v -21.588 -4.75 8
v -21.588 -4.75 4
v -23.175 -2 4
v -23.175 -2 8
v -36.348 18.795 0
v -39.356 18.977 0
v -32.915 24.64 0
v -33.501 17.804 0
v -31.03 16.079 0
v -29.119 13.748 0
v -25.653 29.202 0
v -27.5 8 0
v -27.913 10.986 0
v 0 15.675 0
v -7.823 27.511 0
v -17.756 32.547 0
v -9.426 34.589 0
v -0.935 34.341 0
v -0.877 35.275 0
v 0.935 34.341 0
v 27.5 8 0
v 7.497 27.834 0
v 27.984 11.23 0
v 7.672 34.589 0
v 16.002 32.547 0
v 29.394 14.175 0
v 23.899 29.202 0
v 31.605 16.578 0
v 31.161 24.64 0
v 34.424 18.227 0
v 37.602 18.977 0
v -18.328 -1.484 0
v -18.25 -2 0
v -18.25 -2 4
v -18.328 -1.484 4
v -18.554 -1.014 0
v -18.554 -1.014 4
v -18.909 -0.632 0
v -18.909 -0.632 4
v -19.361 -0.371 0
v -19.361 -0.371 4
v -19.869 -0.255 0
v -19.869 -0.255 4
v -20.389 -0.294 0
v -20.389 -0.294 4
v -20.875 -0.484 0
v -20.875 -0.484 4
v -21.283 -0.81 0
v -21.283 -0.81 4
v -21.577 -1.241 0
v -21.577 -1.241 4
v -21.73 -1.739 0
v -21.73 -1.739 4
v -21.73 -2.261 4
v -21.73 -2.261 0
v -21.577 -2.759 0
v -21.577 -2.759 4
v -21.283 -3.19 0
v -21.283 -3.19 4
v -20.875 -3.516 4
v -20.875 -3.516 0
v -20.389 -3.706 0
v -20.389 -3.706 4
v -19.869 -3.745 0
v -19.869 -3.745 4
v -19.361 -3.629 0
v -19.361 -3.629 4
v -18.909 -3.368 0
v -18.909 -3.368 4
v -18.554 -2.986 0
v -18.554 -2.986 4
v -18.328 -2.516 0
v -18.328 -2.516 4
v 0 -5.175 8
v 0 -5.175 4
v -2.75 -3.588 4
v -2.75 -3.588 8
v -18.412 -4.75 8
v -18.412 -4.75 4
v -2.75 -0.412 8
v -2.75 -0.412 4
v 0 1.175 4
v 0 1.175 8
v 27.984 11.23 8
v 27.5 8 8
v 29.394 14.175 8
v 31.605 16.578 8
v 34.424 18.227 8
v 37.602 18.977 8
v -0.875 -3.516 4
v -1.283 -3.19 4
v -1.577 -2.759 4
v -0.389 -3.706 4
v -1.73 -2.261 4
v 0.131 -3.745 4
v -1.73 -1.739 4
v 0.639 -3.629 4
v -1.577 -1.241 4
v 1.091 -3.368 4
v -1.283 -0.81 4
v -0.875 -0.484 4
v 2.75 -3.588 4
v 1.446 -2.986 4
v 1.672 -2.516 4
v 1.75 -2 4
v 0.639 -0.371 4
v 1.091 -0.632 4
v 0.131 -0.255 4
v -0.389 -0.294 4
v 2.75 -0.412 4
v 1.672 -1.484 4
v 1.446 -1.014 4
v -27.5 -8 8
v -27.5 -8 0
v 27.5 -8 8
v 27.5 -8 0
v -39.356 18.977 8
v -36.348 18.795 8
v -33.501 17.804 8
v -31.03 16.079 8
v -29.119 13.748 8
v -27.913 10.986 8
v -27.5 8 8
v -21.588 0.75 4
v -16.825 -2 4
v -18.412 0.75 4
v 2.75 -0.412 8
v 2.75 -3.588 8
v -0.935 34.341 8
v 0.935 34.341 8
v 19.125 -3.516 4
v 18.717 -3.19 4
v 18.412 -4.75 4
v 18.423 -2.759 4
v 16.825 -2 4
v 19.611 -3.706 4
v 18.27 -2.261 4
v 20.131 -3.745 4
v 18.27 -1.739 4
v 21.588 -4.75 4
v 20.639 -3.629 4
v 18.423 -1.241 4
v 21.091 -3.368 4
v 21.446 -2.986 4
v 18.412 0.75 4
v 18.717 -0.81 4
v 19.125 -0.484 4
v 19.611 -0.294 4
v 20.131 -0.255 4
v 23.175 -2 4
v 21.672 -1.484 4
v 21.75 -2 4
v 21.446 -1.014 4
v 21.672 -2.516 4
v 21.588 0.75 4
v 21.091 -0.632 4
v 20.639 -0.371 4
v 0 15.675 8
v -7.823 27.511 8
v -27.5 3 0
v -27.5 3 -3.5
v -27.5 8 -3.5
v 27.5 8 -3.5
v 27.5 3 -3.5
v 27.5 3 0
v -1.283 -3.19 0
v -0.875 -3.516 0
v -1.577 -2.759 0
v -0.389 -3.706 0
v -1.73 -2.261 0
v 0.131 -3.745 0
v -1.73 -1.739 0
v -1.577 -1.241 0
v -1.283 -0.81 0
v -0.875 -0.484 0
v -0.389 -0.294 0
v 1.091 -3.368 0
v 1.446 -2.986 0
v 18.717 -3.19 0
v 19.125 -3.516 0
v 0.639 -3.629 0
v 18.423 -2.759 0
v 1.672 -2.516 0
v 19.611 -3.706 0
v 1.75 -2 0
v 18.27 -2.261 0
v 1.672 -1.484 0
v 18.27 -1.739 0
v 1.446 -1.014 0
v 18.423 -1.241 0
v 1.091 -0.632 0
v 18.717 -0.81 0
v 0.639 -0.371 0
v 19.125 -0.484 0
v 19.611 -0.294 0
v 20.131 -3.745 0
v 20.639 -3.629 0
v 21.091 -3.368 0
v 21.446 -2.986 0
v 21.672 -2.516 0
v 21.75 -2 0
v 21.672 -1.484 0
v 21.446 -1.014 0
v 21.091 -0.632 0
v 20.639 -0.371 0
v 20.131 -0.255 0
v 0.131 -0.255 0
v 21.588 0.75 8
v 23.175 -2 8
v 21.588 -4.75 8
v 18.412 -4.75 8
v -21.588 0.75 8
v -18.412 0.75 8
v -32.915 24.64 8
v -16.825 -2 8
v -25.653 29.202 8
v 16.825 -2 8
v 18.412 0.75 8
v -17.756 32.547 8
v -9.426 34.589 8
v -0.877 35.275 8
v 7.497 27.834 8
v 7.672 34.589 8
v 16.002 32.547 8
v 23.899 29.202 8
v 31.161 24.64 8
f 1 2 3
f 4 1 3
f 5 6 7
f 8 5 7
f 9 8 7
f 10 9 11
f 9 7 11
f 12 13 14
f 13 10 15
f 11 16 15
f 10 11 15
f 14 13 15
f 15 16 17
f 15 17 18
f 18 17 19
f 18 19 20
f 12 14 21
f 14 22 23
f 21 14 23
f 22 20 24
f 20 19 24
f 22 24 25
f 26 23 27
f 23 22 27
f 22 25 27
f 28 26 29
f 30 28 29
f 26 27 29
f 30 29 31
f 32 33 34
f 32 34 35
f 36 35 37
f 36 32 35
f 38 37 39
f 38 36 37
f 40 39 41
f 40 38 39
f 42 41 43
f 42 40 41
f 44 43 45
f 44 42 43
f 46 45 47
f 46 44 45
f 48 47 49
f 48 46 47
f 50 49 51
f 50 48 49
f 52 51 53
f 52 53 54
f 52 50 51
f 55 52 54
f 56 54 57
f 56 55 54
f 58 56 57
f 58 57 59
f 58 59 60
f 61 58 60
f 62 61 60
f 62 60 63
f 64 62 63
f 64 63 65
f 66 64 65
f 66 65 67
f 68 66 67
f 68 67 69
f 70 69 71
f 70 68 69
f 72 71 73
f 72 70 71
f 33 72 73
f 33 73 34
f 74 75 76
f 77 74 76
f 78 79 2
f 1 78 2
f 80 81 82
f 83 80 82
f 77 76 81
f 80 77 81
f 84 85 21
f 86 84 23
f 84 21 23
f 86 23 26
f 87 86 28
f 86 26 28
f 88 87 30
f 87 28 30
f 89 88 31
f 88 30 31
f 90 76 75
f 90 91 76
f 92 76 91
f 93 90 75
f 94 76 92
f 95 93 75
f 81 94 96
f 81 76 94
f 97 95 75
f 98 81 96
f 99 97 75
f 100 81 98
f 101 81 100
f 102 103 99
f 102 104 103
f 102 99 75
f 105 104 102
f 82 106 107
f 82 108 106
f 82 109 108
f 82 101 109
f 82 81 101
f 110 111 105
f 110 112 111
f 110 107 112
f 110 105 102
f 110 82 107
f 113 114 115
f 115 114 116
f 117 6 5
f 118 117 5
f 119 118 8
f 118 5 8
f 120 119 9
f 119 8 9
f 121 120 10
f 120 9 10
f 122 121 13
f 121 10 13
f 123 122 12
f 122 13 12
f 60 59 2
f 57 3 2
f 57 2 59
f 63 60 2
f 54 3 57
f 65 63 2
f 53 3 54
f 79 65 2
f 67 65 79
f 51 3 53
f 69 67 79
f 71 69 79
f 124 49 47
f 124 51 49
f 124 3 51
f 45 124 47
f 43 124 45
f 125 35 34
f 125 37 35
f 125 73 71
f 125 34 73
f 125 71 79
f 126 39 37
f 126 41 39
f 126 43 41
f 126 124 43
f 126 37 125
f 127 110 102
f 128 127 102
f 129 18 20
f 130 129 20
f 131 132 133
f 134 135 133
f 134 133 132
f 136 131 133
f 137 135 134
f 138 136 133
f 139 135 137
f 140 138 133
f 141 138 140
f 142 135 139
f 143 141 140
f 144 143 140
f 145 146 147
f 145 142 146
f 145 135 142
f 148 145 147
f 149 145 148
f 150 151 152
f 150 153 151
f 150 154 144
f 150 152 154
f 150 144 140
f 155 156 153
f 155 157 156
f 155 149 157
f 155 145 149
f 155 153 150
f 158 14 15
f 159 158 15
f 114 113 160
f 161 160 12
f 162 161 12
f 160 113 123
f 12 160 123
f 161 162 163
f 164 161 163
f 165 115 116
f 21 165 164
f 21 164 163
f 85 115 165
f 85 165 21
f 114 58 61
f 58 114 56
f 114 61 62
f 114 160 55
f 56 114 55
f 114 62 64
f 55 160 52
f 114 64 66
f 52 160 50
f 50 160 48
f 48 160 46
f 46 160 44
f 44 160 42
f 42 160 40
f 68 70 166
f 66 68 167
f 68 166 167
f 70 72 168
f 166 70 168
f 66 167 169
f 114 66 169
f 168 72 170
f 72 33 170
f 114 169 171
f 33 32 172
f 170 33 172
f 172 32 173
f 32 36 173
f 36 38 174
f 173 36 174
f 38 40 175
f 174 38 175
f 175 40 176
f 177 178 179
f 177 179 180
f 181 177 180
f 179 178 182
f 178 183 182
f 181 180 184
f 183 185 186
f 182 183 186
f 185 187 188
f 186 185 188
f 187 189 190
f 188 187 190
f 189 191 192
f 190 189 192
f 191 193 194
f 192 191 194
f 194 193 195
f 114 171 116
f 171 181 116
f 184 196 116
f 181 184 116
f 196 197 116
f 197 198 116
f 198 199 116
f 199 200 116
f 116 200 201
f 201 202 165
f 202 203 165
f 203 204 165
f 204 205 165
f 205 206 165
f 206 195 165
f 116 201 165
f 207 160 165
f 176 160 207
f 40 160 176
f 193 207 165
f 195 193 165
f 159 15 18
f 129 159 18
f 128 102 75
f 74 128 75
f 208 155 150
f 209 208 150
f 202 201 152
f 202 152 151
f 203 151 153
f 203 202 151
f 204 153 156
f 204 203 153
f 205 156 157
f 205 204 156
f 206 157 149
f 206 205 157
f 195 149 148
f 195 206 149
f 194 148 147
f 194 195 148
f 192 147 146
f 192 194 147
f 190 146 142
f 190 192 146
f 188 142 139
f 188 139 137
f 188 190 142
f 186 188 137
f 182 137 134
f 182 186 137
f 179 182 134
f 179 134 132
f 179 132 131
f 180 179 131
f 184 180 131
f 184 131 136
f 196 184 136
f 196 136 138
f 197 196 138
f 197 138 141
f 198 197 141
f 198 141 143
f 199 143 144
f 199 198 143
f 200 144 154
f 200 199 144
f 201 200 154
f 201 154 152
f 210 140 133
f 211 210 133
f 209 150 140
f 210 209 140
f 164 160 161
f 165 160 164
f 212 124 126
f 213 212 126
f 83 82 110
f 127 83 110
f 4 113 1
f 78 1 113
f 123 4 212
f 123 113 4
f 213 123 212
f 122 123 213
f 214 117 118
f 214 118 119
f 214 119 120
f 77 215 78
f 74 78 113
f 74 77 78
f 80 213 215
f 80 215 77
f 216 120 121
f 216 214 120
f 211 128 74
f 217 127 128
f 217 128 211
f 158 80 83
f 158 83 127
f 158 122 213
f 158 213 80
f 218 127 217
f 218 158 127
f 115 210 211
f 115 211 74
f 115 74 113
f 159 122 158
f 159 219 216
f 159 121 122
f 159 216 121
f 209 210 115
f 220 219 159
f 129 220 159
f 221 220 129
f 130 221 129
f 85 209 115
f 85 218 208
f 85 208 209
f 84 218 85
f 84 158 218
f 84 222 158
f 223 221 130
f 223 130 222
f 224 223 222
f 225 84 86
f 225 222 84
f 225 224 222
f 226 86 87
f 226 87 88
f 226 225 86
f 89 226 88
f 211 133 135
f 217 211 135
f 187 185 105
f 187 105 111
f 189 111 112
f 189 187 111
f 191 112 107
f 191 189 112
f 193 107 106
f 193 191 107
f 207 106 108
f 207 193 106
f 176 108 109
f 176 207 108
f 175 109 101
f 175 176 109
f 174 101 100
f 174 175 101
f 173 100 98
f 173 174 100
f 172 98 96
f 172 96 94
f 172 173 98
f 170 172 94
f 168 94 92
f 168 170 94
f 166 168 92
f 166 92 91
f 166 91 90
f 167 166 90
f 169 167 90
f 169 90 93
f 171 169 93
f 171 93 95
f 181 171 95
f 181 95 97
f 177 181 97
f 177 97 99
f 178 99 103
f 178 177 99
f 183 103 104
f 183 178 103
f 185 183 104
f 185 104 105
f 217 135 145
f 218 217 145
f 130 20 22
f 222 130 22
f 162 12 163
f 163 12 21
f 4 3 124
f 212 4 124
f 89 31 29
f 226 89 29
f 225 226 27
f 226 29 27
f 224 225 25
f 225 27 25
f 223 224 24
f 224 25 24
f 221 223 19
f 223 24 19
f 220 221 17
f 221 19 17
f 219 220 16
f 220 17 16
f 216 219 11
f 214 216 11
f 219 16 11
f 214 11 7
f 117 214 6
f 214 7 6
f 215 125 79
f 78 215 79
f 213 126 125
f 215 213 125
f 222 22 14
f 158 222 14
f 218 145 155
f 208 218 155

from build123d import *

# Parameters (mm, degrees)
F0_W     = 55
F0_H     = 11
F0_H_2   = 5
F1_DEPTH = 8
F0_R     = 1.75
F2_DEPTH = 4
F3_DEPTH = 3.5


with BuildPart() as f1:
    # F0 (on Top) → F1 (new body)
    with BuildSketch(Plane.XY):
        with Locations((0, -2.5)):
            Rectangle(F0_W, F0_H)
        Polygon((-16.824574, -2), (-18.412287, -4.75), (-21.587713, -4.75), (-23.175426, -2), (-21.587713, 0.75), (-18.412287, 0.75), align=None, mode=Mode.SUBTRACT)
        Polygon((0, 1.175426), (2.75, -0.412287), (2.75, -3.587713), (0, -5.175426), (-2.75, -3.587713), (-2.75, -0.412287), align=None, mode=Mode.SUBTRACT)
        Polygon((18.412287, -4.75), (16.824574, -2), (18.412287, 0.75), (21.587713, 0.75), (23.175426, -2), (21.587713, -4.75), align=None, mode=Mode.SUBTRACT)
        with Locations((0, 5.5)):
            Rectangle(F0_W, F0_H_2)
        Polygon((-27.5, 8), (27.5, 8), (7.497111, 27.834252), (0, 15.674993), (-7.823137, 27.510974), align=None)
        with BuildLine():
            Line((7.497111, 27.834252), (27.5, 8))
            ThreePointArc((27.5, 8), (30.409967, 15.459144), (37.60235, 18.97715))
            ThreePointArc((37.60235, 18.97715), (-0.876943, 35.275336), (-39.356235, 18.97715))
            ThreePointArc((-39.356235, 18.97715), (-31.029945, 16.078802), (-27.5, 8))
            Line((-27.5, 8), (-7.823137, 27.510974))
            Line((-7.823137, 27.510974), (-0.934656, 34.341381))
            Line((-0.934656, 34.341381), (0.934656, 34.341381))
            Line((0.934656, 34.341381), (7.497111, 27.834252))
        make_face()
    extrude(amount=F1_DEPTH)

    # F0 (on Top) → F2 (join)
    with BuildSketch(Plane.XY):
        Polygon((-21.587713, -4.75), (-18.412287, -4.75), (-16.824574, -2), (-18.412287, 0.75), (-21.587713, 0.75), (-23.175426, -2), align=None)
        with Locations((-20, -2)):
            Circle(F0_R, mode=Mode.SUBTRACT)
        Polygon((2.75, -3.587713), (2.75, -0.412287), (0, 1.175426), (-2.75, -0.412287), (-2.75, -3.587713), (0, -5.175426), align=None)
        with Locations((0, -2)):
            Circle(F0_R, mode=Mode.SUBTRACT)
        Polygon((18.412287, 0.75), (16.824574, -2), (18.412287, -4.75), (21.587713, -4.75), (23.175426, -2), (21.587713, 0.75), align=None)
        with Locations((20, -2)):
            Circle(F0_R, mode=Mode.SUBTRACT)
    extrude(amount=F2_DEPTH)

    # F0 (on Top) → F3 (join)
    with BuildSketch(Plane.XY):
        with Locations((0, 5.5)):
            Rectangle(F0_W, F0_H_2)
    extrude(amount=-F3_DEPTH)


solid = f1.part
